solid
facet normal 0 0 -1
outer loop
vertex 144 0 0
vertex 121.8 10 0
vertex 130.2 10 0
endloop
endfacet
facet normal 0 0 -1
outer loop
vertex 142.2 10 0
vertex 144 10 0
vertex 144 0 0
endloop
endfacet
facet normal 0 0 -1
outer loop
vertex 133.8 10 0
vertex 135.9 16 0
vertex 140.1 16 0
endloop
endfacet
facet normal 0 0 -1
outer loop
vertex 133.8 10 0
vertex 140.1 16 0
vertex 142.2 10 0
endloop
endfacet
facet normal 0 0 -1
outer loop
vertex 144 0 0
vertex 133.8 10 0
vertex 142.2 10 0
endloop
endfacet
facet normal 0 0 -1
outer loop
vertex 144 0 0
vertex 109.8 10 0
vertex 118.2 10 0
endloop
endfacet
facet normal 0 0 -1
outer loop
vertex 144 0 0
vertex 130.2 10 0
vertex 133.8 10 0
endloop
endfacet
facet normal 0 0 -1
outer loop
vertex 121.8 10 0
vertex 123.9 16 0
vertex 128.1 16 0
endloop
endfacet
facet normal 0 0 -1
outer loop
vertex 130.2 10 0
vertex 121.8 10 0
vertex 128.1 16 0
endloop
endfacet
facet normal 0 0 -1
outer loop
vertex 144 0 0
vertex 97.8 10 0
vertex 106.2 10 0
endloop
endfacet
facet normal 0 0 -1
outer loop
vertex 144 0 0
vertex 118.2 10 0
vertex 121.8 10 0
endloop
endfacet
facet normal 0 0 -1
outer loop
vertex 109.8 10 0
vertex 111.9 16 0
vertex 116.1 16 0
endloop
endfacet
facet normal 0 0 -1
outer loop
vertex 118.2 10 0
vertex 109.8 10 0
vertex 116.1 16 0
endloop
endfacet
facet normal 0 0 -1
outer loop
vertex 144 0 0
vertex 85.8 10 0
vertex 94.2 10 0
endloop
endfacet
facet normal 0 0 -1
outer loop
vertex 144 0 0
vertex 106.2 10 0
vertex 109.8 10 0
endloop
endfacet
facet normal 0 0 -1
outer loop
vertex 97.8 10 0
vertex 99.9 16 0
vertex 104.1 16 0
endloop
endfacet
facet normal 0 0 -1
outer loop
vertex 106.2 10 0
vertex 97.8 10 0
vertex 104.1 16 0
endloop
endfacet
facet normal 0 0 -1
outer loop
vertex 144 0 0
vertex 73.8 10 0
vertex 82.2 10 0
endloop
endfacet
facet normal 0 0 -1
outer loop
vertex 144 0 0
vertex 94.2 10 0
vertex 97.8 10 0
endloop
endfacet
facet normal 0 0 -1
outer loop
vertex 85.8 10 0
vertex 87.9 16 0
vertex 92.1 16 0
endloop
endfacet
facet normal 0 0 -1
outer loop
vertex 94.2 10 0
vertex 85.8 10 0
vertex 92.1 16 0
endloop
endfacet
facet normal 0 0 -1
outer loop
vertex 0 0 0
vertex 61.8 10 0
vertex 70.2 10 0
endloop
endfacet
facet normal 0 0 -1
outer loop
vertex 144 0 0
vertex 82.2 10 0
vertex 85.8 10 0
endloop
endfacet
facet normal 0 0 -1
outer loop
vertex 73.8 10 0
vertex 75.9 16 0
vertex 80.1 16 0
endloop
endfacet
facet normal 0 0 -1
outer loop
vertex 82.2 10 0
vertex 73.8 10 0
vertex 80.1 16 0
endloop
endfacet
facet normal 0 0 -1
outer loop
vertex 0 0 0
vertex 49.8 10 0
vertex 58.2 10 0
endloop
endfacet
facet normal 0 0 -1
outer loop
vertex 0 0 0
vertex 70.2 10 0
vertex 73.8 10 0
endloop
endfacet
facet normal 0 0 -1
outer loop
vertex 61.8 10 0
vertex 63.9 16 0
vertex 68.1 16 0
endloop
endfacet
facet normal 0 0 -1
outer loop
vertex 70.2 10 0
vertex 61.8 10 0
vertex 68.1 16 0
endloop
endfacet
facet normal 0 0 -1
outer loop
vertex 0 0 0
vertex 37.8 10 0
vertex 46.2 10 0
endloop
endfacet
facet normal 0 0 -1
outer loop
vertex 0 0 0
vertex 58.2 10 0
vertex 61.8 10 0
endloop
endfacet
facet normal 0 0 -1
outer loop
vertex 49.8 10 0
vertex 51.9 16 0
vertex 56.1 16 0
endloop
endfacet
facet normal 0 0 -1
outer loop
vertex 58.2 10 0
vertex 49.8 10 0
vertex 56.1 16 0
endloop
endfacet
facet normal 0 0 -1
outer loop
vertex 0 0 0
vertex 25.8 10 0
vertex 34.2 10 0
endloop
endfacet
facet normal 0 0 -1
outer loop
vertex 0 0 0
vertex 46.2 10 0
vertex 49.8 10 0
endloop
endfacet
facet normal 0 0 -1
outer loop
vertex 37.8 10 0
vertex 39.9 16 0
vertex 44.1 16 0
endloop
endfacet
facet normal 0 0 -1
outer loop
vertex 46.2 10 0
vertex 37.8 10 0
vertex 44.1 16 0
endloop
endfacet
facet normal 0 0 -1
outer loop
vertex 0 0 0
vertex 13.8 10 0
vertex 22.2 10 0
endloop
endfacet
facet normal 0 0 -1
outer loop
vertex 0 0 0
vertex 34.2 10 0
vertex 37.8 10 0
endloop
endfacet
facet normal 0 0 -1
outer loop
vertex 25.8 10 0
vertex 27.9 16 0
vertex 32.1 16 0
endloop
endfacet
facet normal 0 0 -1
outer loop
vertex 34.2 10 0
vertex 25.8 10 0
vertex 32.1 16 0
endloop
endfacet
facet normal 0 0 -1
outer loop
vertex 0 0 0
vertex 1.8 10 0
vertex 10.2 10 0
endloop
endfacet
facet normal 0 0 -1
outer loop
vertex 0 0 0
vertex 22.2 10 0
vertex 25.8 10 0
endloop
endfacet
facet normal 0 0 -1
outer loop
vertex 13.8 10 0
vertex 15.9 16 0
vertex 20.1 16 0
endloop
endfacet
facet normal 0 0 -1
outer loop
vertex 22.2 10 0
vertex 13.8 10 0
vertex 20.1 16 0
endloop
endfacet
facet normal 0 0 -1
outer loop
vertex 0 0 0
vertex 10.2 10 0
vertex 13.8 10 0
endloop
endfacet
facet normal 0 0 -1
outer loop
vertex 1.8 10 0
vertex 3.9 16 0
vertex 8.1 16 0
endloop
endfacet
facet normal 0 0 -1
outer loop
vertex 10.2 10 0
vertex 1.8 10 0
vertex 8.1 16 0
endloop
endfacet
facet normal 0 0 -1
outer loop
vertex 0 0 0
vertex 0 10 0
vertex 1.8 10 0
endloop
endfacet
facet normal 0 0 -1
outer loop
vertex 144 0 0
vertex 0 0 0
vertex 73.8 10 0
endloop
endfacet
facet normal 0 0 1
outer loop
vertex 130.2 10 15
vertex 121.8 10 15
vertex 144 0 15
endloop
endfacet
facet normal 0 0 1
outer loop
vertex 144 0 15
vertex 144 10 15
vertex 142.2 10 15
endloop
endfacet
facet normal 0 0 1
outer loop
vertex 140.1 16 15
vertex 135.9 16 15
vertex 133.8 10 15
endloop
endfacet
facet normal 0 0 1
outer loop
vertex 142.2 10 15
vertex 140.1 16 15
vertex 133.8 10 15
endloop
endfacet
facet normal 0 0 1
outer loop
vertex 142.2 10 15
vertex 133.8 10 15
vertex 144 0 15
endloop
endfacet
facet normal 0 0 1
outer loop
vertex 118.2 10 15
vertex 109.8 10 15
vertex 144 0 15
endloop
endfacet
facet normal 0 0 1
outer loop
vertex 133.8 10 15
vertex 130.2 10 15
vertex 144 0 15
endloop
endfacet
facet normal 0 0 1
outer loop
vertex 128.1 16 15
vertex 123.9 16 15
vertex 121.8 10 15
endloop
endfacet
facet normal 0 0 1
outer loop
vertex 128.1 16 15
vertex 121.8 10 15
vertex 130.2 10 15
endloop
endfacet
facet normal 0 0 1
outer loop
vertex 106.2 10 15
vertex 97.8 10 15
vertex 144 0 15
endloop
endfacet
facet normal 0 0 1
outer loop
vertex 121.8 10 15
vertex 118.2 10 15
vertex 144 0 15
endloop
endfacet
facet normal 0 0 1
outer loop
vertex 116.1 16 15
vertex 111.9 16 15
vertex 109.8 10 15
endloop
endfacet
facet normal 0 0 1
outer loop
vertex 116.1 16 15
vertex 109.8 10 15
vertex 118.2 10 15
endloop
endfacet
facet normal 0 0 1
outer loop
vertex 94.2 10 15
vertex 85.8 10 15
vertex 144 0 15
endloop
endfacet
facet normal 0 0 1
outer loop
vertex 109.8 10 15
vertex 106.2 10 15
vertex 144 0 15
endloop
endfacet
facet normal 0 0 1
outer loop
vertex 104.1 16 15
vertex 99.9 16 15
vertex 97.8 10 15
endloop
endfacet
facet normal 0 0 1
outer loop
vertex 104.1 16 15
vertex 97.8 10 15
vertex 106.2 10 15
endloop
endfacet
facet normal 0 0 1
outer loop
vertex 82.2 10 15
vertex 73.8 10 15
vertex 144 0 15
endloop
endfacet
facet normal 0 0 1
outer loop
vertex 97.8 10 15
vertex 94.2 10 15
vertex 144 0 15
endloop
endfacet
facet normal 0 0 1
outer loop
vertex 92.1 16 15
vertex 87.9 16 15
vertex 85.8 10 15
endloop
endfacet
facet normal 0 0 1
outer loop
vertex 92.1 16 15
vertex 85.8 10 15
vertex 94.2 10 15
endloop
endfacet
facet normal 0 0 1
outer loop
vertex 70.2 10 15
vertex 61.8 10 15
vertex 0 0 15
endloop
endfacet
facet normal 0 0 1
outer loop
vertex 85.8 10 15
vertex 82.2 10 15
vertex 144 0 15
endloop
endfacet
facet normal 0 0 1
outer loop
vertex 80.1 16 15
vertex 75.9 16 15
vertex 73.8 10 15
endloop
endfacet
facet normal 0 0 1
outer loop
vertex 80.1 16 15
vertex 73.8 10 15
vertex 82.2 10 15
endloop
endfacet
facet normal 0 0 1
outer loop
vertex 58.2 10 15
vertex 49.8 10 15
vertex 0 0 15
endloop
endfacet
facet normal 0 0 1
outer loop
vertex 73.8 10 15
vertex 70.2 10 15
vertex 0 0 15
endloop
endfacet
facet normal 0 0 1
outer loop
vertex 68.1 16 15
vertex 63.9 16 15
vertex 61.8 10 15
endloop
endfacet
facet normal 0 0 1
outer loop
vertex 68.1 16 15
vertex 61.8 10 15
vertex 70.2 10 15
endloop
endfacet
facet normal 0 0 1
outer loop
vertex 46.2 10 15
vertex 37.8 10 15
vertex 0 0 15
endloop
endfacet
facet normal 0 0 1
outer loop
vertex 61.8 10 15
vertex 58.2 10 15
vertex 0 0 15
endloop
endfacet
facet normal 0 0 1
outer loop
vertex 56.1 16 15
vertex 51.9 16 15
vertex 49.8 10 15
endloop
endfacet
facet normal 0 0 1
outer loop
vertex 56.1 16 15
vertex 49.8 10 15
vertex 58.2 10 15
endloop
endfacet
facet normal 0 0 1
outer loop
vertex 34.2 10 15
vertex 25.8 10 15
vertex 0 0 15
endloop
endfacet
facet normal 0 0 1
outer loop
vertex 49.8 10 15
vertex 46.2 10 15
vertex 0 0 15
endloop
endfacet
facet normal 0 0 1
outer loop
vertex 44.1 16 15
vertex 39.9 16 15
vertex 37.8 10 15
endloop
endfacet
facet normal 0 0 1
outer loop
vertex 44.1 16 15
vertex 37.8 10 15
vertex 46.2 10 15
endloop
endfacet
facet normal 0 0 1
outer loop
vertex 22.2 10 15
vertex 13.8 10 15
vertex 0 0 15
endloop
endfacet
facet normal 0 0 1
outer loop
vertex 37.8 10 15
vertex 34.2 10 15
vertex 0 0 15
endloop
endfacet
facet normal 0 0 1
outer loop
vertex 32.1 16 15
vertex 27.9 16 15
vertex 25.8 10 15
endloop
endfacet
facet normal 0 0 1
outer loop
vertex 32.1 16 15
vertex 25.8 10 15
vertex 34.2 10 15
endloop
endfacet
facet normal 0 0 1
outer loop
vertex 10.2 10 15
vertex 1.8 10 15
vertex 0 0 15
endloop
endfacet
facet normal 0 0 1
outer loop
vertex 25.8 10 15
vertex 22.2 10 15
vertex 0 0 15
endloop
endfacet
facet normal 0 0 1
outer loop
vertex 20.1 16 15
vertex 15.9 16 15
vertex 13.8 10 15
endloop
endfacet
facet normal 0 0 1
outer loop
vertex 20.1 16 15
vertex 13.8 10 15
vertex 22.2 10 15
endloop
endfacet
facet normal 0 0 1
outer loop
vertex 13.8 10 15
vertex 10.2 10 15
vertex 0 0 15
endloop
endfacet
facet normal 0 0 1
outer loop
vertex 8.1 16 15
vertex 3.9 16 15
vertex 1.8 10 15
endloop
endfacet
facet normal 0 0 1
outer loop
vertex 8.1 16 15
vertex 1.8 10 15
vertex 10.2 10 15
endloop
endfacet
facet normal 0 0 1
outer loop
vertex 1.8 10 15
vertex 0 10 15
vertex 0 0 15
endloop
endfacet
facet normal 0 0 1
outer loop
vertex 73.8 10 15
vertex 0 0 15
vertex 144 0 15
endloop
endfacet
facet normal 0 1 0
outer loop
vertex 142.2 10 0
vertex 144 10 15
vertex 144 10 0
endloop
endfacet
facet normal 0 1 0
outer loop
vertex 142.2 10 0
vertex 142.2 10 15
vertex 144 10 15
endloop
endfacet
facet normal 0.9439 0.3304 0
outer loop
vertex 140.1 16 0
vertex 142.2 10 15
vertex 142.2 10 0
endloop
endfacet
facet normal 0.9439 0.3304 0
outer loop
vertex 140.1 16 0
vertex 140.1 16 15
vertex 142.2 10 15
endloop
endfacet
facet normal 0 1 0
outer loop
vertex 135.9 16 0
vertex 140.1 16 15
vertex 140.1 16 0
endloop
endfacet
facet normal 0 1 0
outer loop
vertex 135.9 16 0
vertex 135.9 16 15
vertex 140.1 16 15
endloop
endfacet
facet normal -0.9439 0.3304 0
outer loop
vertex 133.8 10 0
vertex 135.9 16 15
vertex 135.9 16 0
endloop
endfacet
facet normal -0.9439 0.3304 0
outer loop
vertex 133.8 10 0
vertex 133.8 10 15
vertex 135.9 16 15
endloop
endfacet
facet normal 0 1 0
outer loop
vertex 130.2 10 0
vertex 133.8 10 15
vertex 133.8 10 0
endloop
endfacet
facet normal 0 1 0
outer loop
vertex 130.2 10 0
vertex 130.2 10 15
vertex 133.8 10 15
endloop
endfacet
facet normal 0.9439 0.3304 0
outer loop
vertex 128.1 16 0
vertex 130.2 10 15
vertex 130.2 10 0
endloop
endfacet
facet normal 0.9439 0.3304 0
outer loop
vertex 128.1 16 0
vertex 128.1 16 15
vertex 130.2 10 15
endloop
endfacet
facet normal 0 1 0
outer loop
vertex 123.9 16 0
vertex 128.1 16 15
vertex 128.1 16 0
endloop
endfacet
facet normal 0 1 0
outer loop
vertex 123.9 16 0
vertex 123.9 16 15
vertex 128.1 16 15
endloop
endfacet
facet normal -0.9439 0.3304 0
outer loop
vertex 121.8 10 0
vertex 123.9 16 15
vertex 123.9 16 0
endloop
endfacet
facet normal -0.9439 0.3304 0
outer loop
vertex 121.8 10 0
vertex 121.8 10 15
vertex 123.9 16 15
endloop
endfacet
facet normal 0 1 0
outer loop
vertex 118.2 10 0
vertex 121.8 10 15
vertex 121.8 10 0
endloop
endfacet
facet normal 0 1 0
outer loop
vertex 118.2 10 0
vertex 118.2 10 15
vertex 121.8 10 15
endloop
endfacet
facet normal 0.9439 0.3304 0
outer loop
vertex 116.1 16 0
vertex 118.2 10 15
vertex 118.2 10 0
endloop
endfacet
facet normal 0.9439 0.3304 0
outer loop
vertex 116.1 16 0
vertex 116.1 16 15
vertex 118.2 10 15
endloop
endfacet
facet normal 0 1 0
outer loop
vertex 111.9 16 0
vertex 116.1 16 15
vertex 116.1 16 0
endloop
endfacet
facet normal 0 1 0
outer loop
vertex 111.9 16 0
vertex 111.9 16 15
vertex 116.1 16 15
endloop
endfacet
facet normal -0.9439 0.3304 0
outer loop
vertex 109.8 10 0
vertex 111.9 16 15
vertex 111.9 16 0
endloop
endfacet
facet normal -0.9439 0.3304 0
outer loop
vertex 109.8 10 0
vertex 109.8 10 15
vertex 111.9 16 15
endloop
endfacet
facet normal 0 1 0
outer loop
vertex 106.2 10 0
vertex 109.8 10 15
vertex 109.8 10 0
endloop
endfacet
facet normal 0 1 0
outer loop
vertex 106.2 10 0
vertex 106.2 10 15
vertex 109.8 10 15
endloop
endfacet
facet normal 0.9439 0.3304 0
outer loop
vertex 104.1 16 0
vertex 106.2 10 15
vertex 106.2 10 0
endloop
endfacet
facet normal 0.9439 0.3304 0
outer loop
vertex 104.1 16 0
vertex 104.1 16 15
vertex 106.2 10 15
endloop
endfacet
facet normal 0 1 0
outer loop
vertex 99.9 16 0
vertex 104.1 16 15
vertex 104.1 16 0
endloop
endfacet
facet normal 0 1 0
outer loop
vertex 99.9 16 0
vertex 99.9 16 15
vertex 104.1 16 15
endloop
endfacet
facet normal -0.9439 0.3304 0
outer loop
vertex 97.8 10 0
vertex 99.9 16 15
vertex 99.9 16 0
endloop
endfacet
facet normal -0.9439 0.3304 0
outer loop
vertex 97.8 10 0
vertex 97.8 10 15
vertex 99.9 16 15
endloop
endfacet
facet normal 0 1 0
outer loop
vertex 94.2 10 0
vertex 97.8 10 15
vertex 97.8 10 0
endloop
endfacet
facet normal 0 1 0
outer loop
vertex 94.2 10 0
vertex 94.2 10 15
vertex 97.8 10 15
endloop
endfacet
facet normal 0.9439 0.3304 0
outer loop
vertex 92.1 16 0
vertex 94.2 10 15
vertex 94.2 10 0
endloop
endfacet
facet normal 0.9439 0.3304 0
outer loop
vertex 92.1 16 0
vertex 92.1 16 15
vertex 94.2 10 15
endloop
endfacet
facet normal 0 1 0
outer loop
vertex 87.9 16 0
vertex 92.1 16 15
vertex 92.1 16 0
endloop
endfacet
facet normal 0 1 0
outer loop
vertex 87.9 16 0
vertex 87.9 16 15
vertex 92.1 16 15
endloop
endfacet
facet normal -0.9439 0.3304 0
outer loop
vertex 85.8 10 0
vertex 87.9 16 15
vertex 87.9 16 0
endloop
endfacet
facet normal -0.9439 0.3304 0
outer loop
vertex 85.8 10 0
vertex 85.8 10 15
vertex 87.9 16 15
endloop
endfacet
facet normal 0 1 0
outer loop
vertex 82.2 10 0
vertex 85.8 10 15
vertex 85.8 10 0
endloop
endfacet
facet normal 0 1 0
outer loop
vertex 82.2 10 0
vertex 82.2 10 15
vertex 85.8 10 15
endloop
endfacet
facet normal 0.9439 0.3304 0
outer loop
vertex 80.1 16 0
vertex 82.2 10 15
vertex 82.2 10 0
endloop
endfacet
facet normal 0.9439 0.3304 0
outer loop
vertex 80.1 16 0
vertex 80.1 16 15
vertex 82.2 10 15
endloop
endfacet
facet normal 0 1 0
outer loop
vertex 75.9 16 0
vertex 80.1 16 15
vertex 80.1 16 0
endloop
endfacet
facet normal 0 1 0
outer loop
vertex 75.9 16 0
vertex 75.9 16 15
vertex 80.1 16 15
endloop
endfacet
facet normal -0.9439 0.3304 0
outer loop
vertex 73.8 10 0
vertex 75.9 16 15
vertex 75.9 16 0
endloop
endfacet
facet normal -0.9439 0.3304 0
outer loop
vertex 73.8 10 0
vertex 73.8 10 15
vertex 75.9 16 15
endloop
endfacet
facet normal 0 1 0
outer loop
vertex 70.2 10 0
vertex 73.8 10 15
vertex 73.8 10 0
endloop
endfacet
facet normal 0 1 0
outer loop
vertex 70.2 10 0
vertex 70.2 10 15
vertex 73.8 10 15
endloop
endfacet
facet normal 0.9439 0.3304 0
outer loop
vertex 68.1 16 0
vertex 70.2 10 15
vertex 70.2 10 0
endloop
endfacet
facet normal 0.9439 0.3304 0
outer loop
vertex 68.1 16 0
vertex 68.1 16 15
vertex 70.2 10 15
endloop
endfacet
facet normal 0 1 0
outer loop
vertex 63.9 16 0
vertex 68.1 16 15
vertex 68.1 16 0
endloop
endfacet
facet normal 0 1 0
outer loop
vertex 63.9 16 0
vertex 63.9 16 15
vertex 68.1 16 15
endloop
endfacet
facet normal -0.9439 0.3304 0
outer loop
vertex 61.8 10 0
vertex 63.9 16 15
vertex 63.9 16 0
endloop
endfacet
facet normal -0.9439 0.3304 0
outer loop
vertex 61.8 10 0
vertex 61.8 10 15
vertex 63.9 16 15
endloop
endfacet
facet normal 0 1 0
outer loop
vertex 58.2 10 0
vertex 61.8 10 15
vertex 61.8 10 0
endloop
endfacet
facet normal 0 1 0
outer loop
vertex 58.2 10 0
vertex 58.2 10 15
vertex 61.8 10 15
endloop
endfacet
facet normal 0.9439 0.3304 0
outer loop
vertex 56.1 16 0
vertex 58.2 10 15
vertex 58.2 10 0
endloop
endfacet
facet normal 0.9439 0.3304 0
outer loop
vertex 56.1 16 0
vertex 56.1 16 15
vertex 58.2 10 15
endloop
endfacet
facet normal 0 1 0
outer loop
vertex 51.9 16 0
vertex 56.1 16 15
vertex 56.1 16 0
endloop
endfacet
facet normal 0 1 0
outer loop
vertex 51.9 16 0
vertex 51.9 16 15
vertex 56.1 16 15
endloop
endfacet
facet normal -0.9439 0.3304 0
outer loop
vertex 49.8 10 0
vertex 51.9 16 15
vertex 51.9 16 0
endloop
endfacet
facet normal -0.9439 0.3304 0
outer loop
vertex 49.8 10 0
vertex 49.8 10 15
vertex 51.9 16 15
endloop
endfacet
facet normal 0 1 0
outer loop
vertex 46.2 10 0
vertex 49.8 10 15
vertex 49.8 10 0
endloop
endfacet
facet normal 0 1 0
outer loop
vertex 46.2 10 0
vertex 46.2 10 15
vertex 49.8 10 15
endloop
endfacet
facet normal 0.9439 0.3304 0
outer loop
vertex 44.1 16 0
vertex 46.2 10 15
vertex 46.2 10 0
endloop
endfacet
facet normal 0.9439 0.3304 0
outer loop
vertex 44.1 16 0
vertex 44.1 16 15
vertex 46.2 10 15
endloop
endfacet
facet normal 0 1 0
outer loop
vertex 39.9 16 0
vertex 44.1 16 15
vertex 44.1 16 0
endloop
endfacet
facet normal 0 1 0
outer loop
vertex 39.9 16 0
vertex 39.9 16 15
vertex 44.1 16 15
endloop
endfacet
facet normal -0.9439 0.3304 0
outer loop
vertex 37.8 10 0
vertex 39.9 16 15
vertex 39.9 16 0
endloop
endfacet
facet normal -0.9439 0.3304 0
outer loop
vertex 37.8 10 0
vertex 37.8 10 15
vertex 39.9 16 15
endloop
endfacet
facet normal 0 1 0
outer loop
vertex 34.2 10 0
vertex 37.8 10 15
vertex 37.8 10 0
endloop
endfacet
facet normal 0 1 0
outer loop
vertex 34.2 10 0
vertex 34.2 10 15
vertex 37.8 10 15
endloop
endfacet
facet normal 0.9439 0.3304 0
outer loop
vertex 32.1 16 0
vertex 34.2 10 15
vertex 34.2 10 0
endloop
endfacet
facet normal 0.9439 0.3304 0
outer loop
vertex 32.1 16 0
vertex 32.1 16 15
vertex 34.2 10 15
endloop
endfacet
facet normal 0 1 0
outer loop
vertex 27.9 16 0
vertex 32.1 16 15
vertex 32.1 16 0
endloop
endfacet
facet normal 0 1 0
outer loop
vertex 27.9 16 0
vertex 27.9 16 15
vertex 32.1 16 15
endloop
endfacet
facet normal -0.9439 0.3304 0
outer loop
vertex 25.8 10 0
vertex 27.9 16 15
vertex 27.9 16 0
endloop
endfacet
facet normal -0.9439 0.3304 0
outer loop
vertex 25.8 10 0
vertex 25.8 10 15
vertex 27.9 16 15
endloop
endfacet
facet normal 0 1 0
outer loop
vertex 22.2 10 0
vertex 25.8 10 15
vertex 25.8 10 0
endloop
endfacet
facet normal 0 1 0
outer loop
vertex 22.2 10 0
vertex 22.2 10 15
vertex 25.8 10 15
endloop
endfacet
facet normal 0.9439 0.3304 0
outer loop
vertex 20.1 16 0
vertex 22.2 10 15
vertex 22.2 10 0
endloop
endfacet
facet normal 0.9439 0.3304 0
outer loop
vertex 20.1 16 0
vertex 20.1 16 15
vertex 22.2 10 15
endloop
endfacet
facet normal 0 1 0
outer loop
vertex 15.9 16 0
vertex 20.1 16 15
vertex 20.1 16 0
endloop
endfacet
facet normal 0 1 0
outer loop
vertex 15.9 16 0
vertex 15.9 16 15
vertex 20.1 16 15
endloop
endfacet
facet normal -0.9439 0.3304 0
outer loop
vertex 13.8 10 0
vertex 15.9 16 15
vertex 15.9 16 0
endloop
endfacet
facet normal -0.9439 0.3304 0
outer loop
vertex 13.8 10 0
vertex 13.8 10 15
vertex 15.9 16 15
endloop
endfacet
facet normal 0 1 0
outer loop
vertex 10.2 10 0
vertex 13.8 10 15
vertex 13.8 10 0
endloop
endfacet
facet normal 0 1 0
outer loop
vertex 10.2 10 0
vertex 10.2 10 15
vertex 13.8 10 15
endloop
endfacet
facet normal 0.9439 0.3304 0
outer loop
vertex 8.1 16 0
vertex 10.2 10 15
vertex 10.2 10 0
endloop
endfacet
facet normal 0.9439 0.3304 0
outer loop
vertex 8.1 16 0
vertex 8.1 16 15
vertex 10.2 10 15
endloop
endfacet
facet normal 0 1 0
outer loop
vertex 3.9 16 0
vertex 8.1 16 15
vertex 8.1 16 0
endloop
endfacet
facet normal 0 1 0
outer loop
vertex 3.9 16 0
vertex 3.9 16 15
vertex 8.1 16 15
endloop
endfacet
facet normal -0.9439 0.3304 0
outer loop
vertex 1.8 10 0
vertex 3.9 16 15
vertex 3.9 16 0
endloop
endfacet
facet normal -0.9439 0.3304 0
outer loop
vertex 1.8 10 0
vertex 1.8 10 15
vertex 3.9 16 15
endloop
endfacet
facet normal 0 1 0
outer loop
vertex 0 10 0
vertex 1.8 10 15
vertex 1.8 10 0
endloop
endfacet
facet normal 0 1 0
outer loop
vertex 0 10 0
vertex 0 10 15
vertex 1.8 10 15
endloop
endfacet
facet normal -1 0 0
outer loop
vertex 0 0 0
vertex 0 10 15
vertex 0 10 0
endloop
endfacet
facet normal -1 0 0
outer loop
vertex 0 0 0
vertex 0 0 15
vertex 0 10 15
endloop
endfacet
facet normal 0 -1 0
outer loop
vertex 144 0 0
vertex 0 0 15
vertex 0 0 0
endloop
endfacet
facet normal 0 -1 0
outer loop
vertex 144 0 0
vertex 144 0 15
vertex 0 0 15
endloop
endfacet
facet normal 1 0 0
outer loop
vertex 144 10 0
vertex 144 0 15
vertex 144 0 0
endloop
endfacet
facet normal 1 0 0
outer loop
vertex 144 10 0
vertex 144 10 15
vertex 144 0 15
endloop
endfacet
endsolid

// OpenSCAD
$fn = 32;

// ----------------------------------------------------------------------
// Gear rack: 12 teeth, pitch 12 mm
// ----------------------------------------------------------------------

// --- parameters (mm) ---
teeth = 12;               // number of teeth
pitch = 12;               // tooth pitch, X
root_w = 8.4;             // tooth width at the root
tip_w = 4.2;              // tooth width at the tip
base_h = 10;              // rack body height, Y
tooth_h = 6;              // tooth height above the body
plate_t = 15;             // rack width, Z (extrusion height)

rack_l = teeth * pitch;  // overall length
total_h = base_h + tooth_h;  // overall height

profile = [[0, 0], [144, 0], [144, 10], [142.2, 10], [140.1, 16], [135.9, 16], [133.8, 10], [130.2, 10], [128.1, 16], [123.9, 16], [121.8, 10], [118.2, 10], [116.1, 16], [111.9, 16], [109.8, 10], [106.2, 10], [104.1, 16], [99.9, 16], [97.8, 10], [94.2, 10], [92.1, 16], [87.9, 16], [85.8, 10], [82.2, 10], [80.1, 16], [75.9, 16], [73.8, 10], [70.2, 10], [68.1, 16], [63.9, 16], [61.8, 10], [58.2, 10], [56.1, 16], [51.9, 16], [49.8, 10], [46.2, 10], [44.1, 16], [39.9, 16], [37.8, 10], [34.2, 10], [32.1, 16], [27.9, 16], [25.8, 10], [22.2, 10], [20.1, 16], [15.9, 16], [13.8, 10], [10.2, 10], [8.1, 16], [3.9, 16], [1.8, 10], [0, 10]];  // primary outline, 52 points, counter clockwise

// --- the one profile operation ---
linear_extrude(height = plate_t) polygon(points = profile);
